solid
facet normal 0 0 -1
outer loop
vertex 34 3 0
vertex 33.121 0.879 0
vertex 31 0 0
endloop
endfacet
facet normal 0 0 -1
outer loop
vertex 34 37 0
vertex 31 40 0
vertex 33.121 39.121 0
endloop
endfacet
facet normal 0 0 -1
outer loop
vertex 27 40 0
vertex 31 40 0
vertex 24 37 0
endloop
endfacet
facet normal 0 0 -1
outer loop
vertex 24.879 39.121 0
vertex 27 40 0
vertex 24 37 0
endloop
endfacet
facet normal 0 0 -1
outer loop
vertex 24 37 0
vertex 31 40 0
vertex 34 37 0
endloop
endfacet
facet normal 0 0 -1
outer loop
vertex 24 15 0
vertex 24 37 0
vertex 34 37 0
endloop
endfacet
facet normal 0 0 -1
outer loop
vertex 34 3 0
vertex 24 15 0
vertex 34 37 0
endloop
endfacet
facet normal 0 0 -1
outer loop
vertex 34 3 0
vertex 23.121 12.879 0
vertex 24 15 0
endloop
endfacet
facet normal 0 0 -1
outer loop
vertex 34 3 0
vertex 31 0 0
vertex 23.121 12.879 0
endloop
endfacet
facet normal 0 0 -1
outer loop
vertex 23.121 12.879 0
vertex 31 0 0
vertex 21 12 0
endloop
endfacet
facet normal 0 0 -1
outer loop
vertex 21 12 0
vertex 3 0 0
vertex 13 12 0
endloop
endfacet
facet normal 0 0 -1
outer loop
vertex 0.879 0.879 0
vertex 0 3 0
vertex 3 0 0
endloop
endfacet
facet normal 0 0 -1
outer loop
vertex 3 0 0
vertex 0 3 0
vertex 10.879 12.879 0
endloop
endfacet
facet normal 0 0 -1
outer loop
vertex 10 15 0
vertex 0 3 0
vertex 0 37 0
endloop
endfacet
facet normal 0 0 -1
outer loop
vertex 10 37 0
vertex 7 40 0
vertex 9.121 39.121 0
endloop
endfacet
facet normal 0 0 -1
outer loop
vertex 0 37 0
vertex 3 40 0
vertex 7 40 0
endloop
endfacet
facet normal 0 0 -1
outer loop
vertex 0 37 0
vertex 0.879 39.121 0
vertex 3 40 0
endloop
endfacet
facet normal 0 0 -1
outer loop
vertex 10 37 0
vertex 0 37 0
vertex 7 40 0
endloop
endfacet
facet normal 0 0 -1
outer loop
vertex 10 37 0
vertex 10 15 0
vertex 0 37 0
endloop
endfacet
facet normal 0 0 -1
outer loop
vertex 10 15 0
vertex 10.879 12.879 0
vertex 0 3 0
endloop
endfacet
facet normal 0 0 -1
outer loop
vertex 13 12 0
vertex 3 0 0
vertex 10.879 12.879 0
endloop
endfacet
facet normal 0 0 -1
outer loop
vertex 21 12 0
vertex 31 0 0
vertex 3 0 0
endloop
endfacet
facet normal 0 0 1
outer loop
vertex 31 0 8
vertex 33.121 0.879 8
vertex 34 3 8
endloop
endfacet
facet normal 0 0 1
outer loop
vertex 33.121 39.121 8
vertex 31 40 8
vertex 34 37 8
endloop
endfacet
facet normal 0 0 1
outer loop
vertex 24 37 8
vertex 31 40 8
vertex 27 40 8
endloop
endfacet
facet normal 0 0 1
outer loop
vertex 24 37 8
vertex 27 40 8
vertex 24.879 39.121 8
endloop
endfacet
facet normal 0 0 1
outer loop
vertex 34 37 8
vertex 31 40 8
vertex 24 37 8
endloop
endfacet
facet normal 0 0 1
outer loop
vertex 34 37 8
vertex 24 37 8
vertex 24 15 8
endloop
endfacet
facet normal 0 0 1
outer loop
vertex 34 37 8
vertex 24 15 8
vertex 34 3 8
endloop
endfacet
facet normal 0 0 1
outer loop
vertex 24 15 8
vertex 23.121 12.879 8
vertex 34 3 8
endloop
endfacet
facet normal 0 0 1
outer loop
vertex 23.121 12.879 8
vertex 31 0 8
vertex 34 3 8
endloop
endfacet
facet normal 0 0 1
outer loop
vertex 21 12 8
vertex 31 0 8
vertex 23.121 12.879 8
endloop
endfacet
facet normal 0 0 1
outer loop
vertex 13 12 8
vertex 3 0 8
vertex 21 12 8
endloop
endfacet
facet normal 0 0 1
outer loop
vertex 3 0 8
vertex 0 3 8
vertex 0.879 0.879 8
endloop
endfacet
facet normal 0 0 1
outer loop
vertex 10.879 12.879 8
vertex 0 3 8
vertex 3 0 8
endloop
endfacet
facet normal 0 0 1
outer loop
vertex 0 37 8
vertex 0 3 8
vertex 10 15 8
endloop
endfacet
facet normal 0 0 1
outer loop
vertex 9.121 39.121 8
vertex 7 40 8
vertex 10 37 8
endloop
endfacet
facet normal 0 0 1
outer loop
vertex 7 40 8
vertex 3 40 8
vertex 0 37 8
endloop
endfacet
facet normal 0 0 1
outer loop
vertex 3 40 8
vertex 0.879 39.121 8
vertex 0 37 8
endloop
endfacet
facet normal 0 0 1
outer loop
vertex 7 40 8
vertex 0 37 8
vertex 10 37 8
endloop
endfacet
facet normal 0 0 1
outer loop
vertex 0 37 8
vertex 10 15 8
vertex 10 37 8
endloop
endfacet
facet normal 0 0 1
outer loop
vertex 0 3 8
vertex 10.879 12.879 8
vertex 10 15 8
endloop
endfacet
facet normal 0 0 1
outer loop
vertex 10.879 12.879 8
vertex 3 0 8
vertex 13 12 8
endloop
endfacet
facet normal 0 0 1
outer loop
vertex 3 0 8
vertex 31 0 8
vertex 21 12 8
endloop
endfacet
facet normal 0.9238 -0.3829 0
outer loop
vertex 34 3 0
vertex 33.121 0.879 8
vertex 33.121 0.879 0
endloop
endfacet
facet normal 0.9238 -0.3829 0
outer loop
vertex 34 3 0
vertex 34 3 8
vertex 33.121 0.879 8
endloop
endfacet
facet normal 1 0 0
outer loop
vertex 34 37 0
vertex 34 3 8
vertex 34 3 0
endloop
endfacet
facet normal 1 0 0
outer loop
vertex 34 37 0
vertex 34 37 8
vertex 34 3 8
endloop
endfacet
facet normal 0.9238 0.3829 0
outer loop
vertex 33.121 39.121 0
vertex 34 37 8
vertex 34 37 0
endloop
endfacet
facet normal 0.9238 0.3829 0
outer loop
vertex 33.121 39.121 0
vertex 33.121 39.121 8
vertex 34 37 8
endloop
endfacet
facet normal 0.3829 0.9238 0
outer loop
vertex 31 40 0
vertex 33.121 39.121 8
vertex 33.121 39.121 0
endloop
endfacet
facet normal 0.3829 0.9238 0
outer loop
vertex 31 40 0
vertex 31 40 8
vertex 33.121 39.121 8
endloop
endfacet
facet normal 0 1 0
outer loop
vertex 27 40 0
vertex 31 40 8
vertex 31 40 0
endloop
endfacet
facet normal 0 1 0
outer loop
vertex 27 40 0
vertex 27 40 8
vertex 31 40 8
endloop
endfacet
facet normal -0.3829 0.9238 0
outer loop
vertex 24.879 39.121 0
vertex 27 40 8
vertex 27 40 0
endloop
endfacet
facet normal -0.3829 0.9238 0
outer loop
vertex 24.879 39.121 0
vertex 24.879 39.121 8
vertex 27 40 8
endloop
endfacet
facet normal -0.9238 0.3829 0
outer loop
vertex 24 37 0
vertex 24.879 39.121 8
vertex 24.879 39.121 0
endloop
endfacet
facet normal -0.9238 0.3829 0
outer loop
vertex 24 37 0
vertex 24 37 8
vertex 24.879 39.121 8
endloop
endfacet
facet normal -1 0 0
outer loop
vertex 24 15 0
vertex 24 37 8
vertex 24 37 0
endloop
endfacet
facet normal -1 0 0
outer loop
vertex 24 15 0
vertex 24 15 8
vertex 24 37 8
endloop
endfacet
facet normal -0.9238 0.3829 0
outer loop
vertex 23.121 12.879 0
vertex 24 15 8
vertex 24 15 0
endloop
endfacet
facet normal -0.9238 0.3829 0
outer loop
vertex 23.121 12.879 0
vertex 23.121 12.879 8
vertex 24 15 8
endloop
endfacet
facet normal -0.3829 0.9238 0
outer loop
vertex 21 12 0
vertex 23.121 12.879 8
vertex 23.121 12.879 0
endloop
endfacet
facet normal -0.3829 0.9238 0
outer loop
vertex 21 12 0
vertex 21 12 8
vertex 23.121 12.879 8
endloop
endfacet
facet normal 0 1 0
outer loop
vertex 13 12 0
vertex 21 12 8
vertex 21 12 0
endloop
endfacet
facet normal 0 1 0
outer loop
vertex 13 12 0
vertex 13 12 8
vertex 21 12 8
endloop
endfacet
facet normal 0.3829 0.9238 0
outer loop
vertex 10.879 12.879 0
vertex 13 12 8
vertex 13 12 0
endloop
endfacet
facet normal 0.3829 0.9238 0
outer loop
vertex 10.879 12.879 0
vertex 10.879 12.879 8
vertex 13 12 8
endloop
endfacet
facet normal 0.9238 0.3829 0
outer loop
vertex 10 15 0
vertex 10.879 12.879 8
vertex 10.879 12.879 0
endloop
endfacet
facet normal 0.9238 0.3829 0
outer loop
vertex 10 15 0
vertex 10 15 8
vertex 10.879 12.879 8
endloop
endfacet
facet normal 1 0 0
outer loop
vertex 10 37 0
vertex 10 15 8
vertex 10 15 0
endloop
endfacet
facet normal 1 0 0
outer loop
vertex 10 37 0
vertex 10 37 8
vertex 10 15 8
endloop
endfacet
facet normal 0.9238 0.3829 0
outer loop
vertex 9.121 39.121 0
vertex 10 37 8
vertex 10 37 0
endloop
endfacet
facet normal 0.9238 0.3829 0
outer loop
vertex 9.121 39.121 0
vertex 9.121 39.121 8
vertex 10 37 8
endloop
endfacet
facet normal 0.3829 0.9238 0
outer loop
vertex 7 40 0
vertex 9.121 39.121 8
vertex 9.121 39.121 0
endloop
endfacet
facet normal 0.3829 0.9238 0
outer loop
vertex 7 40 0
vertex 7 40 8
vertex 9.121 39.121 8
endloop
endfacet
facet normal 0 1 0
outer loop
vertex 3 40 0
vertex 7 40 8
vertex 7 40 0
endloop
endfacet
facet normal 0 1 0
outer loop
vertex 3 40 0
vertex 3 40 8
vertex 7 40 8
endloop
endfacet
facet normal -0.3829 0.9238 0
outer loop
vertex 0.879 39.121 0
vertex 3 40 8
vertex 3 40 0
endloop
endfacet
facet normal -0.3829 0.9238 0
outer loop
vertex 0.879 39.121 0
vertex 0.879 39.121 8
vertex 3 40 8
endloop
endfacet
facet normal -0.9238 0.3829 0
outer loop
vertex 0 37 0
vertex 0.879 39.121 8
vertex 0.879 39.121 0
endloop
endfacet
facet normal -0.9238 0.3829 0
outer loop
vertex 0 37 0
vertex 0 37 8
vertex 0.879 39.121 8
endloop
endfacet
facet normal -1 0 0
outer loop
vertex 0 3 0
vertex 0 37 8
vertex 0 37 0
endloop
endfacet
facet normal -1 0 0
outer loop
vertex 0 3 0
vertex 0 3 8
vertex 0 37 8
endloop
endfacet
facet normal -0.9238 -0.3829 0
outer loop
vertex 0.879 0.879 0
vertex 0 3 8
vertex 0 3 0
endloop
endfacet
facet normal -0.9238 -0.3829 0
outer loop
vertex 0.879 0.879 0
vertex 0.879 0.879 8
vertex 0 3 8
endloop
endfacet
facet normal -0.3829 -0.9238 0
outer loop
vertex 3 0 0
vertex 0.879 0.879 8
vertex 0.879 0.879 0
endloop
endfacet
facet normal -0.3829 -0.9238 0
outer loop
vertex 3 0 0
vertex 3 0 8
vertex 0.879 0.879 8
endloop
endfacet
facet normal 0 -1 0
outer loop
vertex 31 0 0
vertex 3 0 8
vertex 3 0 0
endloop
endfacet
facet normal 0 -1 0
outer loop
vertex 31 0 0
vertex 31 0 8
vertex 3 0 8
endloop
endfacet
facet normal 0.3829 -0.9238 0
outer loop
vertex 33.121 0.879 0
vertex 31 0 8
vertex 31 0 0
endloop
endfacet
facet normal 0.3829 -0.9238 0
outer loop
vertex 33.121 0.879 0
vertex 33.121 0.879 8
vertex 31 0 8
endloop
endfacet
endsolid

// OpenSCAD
$fn = 32;

// ----------------------------------------------------------------------
// Eye lug: clevis, 8 mm thick
// ----------------------------------------------------------------------

// --- parameters (mm) ---
profile_height = 8;       // extrusion height
profile_points = 24;      // points of the closed outline

profile = [[0, 3], [0.879, 0.879], [3, 0], [31, 0], [33.121, 0.879], [34, 3], [34, 37], [33.121, 39.121], [31, 40], [27, 40], [24.879, 39.121], [24, 37], [24, 15], [23.121, 12.879], [21, 12], [13, 12], [10.879, 12.879], [10, 15], [10, 37], [9.121, 39.121], [7, 40], [3, 40], [0.879, 39.121], [0, 37]];  // single closed polygon, 24 points, counter clockwise

// --- the one profile operation ---
linear_extrude(height = profile_height) polygon(points = profile);
